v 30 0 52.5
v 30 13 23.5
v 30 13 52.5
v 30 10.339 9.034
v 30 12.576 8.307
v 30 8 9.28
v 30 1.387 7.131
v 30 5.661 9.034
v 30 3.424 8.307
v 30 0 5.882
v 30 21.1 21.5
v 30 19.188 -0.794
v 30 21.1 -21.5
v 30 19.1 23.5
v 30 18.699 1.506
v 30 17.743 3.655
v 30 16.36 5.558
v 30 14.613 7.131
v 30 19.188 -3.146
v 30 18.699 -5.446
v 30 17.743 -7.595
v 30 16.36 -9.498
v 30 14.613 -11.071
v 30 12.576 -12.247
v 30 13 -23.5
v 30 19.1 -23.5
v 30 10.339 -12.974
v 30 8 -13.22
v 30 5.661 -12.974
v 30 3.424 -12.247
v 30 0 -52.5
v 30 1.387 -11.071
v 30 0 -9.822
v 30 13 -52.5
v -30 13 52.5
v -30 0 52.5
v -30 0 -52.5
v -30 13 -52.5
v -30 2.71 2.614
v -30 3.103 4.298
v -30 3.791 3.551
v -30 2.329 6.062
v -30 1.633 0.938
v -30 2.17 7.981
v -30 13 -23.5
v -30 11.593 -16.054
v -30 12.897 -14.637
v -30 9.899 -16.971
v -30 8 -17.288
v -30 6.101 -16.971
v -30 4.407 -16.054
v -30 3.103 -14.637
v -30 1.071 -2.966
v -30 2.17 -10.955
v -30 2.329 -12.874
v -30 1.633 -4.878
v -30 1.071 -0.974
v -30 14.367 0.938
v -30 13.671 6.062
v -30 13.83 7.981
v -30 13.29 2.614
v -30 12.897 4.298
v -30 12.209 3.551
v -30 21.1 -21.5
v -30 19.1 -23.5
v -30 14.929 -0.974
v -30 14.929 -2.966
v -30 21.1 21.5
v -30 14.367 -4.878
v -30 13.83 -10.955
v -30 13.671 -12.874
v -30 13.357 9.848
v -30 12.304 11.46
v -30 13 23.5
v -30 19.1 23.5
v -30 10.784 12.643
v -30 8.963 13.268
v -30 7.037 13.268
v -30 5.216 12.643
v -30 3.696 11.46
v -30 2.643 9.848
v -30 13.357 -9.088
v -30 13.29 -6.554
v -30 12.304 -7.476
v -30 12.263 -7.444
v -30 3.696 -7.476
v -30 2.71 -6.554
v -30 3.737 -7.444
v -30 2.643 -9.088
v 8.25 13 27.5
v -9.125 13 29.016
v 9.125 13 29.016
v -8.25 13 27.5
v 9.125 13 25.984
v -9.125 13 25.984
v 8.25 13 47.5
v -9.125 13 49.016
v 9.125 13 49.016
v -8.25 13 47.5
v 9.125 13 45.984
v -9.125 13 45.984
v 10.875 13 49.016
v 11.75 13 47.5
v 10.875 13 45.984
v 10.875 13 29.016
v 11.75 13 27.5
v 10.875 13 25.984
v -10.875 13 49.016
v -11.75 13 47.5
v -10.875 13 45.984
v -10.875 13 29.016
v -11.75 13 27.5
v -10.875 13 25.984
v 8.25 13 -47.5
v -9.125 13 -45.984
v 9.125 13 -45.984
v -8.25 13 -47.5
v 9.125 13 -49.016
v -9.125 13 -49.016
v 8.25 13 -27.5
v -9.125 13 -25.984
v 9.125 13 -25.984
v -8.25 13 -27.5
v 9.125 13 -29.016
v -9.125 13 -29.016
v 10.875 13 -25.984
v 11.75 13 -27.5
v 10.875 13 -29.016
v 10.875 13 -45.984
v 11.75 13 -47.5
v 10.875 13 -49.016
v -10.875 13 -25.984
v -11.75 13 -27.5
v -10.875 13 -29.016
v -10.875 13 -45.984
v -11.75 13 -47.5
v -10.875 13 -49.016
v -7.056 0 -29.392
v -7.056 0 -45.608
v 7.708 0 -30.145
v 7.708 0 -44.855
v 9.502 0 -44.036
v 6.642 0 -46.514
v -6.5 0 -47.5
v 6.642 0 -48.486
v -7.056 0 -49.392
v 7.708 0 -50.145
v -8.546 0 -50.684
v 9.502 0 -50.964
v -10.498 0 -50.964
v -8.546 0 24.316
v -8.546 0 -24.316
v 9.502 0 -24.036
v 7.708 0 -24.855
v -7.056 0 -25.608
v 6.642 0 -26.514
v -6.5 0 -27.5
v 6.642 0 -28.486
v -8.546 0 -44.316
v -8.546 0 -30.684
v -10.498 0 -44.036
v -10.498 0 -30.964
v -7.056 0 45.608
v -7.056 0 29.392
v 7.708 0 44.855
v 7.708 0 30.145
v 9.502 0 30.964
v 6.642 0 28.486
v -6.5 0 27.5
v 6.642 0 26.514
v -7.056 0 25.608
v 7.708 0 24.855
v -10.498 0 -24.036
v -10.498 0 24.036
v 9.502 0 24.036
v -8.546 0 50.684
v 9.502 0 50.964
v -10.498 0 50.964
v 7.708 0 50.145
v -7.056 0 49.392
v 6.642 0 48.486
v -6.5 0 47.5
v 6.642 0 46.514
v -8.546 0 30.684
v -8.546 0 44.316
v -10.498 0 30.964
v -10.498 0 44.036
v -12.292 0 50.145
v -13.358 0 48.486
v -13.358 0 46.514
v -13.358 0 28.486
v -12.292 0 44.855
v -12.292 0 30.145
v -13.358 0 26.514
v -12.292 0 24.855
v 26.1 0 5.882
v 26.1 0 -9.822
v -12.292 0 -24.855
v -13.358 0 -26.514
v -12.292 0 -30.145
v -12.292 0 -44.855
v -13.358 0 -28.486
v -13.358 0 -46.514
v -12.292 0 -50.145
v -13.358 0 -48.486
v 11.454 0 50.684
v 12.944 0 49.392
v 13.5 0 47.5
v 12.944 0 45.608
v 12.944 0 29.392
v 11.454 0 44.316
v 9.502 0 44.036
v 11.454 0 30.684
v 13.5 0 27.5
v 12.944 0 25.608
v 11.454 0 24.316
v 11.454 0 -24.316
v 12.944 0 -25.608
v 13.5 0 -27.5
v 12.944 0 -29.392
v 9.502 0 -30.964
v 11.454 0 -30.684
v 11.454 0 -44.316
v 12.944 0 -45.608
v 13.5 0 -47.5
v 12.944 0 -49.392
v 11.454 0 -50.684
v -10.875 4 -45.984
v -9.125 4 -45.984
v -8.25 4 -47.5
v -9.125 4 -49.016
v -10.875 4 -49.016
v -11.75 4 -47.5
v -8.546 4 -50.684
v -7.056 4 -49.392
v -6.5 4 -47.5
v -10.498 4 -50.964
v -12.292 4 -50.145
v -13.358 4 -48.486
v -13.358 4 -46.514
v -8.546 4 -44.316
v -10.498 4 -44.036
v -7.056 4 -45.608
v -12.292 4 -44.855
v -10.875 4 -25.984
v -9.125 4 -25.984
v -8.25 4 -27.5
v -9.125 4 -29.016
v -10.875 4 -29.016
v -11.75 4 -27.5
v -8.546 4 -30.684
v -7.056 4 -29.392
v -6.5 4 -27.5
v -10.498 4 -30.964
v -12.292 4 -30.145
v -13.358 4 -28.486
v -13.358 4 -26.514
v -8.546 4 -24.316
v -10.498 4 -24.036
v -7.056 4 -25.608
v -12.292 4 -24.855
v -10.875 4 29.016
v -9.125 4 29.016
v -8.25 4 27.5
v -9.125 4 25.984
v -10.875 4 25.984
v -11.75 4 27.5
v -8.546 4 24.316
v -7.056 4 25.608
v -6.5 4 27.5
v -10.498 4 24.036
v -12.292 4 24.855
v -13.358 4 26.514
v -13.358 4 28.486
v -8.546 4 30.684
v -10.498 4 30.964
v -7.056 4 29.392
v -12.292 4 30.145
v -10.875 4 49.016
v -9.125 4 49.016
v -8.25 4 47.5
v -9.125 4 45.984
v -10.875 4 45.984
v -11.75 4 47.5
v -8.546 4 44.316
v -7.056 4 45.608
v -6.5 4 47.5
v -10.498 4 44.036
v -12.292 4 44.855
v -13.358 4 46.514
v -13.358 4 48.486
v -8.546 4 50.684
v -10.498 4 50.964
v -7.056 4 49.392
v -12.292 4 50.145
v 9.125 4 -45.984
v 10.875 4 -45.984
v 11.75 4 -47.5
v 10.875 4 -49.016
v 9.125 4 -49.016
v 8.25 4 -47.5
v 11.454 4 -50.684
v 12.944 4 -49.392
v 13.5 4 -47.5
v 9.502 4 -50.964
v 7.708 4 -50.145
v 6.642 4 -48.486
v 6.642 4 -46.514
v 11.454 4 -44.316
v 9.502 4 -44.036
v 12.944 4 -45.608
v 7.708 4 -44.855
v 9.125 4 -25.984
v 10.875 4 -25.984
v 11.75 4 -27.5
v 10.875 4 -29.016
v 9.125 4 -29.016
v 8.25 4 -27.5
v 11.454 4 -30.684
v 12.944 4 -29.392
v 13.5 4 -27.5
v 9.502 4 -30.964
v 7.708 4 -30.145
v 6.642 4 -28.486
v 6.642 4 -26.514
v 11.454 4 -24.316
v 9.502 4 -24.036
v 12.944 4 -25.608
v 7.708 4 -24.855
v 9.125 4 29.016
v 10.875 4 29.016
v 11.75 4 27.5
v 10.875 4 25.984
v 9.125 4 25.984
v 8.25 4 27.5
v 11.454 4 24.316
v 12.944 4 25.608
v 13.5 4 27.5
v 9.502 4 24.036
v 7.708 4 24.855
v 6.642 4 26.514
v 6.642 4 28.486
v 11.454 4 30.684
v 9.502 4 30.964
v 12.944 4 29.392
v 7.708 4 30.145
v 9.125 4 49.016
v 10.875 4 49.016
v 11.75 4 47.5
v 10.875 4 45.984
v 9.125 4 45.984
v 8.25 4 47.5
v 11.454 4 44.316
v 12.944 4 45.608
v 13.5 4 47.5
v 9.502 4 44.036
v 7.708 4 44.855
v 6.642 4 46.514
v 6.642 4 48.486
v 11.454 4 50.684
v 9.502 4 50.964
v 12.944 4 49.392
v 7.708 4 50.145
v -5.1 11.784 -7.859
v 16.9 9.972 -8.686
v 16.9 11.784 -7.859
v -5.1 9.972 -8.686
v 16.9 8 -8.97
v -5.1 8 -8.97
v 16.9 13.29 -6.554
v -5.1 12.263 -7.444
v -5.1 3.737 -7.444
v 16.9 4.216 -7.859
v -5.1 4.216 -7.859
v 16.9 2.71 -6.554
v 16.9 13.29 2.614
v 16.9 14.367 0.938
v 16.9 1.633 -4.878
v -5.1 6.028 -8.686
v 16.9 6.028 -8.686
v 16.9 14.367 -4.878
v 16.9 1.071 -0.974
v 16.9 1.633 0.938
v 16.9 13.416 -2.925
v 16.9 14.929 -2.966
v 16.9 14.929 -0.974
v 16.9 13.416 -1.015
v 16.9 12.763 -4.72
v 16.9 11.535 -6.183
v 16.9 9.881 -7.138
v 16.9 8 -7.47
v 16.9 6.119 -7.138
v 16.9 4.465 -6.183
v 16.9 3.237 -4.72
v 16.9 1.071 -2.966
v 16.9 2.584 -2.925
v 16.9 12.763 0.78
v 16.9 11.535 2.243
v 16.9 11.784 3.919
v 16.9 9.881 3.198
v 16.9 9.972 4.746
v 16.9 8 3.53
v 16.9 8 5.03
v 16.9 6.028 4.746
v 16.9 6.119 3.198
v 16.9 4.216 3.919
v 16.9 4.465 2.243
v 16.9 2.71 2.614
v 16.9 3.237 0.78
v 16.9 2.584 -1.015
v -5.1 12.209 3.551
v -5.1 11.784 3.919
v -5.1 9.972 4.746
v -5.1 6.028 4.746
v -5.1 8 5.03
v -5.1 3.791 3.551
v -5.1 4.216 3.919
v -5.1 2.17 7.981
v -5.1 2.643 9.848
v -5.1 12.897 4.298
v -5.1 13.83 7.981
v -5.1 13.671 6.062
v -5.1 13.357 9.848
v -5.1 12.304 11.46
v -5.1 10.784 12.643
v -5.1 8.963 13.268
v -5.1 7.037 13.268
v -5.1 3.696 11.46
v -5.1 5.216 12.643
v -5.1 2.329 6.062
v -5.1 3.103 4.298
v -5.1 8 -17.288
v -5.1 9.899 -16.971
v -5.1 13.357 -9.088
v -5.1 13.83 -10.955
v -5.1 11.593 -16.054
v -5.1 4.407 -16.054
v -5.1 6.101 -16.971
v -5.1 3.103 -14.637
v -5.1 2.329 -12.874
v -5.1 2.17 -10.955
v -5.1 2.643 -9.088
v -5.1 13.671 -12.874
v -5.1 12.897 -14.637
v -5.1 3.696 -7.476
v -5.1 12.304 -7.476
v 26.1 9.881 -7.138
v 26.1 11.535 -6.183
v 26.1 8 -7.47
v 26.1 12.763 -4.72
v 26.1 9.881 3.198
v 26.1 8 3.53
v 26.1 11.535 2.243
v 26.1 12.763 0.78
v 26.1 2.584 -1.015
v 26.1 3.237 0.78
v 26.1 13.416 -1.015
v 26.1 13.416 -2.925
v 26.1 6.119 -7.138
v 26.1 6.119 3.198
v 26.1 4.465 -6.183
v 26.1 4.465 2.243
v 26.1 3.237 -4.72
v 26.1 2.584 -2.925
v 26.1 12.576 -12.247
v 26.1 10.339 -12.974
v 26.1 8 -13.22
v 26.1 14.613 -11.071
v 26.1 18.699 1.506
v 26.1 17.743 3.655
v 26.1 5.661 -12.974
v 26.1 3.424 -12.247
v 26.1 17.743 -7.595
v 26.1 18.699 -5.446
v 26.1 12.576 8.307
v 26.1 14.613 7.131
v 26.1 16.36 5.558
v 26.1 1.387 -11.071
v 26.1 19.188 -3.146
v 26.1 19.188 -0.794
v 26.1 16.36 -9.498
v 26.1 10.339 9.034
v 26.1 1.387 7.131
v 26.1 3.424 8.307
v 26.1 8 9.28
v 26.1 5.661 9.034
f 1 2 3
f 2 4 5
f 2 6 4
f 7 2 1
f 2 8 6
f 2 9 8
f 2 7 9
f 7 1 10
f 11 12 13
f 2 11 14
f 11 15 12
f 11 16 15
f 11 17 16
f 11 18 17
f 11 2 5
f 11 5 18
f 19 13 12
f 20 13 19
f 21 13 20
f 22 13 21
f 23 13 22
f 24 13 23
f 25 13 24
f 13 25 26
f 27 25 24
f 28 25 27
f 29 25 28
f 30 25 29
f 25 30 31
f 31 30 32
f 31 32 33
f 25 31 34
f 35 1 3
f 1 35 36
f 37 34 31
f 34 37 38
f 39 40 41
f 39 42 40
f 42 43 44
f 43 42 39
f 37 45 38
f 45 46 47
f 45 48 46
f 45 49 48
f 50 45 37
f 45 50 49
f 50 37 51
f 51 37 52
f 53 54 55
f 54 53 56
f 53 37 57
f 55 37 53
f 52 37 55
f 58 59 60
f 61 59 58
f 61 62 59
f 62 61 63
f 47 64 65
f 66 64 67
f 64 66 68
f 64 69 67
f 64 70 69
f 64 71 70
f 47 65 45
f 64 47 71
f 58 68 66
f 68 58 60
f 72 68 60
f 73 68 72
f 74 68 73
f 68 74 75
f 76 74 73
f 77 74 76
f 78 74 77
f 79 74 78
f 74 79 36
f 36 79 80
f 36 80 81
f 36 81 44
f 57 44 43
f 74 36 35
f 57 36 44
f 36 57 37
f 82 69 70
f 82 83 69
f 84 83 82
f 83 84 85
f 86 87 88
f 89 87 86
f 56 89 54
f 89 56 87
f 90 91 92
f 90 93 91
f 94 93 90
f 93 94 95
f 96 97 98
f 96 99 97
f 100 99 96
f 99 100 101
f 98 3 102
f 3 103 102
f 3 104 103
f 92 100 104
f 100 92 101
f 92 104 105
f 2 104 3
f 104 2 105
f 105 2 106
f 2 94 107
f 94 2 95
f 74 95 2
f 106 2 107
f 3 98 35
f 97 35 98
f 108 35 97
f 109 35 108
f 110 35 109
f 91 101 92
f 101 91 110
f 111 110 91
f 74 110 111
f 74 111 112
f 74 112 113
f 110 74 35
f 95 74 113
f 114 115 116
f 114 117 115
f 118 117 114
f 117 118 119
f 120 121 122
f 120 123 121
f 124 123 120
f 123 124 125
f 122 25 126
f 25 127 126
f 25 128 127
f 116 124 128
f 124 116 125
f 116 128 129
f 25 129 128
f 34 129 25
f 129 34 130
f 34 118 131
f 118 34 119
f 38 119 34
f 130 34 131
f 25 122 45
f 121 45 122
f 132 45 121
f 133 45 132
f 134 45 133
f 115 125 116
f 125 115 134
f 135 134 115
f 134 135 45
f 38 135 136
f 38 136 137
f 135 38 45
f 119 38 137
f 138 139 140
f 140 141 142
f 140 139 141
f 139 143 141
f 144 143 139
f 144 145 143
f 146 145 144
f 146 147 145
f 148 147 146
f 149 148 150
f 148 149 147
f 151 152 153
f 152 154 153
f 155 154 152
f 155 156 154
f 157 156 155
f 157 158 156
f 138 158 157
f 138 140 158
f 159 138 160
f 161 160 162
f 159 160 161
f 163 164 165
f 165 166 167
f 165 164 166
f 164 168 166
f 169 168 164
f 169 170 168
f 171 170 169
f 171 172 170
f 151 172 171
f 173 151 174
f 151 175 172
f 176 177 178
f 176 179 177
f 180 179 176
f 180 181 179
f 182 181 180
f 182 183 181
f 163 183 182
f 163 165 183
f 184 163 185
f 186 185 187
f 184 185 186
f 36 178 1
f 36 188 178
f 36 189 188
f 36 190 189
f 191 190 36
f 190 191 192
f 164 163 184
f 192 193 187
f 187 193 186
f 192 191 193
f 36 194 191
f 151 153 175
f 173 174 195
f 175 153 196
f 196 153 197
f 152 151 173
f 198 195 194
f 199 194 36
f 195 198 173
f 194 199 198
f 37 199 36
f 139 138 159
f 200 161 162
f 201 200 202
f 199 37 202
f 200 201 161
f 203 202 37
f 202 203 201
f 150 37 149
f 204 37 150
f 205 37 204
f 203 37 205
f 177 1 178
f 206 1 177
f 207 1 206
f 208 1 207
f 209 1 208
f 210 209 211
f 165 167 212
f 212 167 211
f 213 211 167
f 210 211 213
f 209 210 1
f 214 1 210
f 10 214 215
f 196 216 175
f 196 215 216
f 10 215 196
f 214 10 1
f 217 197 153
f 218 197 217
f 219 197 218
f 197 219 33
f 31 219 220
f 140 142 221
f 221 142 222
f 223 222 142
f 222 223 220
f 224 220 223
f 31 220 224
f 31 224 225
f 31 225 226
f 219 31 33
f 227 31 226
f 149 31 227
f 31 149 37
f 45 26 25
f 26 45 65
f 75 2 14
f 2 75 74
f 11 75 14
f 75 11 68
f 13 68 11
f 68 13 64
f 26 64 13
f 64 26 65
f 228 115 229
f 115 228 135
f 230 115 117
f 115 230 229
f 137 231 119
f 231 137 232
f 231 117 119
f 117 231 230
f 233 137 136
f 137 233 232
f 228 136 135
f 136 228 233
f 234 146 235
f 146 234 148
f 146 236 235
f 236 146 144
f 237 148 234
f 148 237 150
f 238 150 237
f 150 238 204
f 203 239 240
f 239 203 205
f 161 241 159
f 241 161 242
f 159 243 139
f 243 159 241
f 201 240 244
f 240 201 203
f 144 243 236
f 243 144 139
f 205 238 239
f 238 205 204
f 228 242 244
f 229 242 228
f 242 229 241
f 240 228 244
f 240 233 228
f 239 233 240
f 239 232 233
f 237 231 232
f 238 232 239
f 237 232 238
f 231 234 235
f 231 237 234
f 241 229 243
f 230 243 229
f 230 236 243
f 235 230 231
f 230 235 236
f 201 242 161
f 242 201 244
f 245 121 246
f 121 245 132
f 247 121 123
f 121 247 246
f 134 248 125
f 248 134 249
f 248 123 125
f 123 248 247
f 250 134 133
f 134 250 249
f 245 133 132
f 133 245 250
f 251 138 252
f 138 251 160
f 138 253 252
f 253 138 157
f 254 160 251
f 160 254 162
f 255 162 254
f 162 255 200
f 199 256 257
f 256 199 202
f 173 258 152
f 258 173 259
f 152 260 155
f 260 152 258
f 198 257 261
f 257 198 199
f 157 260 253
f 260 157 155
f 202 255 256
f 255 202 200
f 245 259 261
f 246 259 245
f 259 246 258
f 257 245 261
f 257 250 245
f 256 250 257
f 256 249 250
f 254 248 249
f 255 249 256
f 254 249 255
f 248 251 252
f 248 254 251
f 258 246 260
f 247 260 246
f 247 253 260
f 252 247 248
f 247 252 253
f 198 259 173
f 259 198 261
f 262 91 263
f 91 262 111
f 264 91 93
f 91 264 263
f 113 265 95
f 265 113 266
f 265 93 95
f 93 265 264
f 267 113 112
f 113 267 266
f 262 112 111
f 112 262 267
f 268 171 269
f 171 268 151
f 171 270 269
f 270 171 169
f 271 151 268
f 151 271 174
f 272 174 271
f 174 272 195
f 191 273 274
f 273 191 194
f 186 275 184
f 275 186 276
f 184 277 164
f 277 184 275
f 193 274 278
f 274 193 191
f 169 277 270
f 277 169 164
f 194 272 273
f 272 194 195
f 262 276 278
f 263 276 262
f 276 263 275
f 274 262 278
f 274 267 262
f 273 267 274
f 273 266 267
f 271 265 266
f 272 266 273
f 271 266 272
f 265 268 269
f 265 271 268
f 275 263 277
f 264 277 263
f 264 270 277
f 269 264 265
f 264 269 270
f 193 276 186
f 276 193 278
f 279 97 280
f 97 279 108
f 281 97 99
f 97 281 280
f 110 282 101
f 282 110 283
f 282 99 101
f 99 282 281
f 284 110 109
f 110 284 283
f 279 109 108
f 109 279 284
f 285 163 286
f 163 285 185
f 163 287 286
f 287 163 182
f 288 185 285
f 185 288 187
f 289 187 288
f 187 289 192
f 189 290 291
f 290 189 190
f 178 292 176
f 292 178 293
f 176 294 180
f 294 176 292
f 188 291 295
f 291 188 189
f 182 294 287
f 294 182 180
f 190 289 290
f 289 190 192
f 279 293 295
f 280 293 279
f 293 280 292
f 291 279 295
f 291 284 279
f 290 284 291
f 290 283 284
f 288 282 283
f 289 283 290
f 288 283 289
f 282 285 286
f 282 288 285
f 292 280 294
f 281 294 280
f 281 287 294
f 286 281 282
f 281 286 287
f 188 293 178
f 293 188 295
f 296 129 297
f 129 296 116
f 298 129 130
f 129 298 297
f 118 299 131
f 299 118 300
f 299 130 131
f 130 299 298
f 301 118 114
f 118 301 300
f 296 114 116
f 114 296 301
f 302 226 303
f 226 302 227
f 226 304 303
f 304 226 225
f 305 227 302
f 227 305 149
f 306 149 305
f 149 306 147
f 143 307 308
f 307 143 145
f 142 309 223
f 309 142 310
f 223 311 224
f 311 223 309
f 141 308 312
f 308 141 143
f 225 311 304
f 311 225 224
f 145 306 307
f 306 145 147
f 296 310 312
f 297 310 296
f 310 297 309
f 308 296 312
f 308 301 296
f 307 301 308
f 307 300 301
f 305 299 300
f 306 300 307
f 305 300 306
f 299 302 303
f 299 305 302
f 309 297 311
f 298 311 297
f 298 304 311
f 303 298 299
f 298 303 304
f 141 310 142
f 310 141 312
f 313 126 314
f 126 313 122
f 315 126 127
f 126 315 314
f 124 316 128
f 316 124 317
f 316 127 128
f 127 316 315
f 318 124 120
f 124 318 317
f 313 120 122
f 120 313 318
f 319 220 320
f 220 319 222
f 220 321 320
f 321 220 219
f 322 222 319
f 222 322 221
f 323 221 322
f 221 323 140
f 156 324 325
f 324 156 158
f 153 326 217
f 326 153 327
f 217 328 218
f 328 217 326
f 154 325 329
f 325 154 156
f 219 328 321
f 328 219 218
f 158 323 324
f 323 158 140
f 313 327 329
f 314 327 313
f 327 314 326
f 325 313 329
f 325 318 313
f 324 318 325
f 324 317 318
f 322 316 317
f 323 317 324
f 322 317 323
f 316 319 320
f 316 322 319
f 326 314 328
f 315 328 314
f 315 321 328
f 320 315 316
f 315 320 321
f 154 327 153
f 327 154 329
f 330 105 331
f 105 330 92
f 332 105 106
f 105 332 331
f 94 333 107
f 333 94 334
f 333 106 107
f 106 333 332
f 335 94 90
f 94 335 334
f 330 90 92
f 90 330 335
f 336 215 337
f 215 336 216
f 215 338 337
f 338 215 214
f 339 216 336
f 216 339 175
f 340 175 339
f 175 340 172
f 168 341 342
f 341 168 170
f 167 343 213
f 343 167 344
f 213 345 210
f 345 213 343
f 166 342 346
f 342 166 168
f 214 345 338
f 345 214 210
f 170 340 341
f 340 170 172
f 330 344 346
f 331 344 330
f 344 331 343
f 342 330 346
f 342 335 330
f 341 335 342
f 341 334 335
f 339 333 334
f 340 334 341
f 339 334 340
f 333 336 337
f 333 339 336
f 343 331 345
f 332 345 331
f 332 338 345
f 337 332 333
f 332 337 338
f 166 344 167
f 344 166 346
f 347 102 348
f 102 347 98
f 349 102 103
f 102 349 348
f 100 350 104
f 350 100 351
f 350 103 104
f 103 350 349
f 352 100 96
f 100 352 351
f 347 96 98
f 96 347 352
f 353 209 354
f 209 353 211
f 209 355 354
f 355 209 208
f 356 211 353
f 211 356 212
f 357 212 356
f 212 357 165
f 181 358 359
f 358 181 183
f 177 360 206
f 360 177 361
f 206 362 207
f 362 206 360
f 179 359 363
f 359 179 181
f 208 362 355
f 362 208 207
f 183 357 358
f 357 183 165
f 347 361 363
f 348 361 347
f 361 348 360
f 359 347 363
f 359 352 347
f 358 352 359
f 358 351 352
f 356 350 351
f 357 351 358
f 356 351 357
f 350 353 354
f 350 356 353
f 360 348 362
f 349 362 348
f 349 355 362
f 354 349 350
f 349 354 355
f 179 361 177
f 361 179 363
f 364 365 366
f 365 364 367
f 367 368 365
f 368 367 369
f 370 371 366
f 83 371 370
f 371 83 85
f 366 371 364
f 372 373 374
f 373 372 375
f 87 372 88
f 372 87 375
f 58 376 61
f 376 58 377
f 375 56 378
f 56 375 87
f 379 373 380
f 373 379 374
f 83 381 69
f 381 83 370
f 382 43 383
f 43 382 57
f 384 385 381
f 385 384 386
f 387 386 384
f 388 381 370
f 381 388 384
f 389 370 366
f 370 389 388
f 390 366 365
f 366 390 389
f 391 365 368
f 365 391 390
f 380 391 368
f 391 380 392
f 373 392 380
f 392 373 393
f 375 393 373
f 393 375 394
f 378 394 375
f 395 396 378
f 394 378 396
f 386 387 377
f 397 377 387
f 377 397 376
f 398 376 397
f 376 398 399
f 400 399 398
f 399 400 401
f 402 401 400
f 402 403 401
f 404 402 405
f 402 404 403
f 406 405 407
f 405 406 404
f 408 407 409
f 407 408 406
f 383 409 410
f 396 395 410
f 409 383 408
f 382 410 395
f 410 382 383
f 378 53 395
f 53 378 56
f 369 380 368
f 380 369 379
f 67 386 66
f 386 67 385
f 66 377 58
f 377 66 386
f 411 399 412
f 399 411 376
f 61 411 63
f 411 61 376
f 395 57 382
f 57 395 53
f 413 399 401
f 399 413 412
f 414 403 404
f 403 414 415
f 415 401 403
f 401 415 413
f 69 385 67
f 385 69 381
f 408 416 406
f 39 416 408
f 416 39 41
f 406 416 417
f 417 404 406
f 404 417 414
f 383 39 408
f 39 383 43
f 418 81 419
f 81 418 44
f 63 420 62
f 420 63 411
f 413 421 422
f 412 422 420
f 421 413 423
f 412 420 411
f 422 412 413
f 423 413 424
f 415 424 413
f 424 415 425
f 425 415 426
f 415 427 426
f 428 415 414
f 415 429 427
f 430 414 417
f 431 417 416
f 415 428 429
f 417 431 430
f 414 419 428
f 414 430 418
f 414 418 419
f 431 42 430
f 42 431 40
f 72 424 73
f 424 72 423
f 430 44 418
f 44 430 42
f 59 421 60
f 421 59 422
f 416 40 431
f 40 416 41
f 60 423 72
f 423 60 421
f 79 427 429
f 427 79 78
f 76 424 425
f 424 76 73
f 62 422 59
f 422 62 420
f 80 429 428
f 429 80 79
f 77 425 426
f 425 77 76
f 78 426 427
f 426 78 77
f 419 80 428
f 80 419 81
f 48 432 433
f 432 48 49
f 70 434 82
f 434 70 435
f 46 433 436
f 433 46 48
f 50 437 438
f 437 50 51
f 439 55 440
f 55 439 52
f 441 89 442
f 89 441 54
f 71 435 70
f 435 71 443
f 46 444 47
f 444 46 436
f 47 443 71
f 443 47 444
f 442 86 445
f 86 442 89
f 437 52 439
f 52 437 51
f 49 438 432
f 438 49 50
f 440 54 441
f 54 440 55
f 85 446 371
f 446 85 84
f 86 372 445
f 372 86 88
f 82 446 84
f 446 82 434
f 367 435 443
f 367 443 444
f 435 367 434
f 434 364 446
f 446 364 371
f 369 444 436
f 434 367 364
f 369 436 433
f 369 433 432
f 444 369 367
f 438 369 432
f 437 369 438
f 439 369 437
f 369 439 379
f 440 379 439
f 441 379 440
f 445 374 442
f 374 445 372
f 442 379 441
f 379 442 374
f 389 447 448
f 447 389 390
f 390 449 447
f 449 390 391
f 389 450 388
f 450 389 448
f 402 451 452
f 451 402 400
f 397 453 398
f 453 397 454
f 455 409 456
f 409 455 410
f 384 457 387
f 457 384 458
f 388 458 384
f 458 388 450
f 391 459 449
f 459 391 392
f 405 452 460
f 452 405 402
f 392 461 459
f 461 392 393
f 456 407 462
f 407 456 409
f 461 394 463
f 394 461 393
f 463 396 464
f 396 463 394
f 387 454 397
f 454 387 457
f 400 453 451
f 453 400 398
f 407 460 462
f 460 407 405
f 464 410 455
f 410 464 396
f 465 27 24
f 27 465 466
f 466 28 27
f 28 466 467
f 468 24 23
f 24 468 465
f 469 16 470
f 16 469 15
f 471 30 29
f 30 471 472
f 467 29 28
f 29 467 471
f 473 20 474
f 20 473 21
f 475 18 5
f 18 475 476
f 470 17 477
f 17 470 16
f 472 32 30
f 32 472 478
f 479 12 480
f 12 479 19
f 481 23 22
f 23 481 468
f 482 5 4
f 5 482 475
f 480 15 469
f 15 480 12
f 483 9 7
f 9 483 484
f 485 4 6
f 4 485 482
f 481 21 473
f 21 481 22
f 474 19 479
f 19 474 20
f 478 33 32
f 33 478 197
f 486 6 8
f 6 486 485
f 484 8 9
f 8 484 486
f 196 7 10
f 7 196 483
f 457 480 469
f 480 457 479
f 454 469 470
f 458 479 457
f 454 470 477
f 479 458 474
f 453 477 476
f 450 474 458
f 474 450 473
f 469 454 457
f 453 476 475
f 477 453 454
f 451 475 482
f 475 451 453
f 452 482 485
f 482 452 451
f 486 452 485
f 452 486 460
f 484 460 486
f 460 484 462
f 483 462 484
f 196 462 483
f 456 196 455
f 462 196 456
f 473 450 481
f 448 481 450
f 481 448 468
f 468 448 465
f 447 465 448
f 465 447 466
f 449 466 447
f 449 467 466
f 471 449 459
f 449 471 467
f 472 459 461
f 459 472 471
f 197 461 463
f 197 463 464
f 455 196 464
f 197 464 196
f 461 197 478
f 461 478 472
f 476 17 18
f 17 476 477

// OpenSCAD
difference() {
union() {
multmatrix([[1, 0, 0, 0], [0, 1, 0, 13/2], [0, 0, 1, 0], [0, 0, 0, 1]]) cube([60, 13, 105], center=true);
multmatrix([[1, 0, 0, -30], [0, 1, 0, 8], [0, 0, 1, 0], [0, 0, 0, 1]]) multmatrix([[6.123233995736766E-17, 0.0, 1.0], [0.0, 1.0, 0.0], [-1.0, 0.0, 6.123233995736766E-17]]) linear_extrude(60) polygon(points=[[23.5, 0], [23.5, 11.1], [21.5, 13.1], [-21.5, 13.1], [-23.5, 11.1], [-23.5, 0]]);
}

union() {
multmatrix([[1, 0, 0, -10], [0, 1, 0, -0.1], [0, 0, 1, -95/2], [0, 0, 0, 1]]) multmatrix([[1.0, -0.0, 0.0], [0.0, 6.123233995736766E-17, 1.0], [-0.0, -1.0, 6.123233995736766E-17]]) union() {
cylinder(h=13.2, d=3.5);
cylinder(h=4.1, d=7.0);
}

multmatrix([[1, 0, 0, -10], [0, 1, 0, -0.1], [0, 0, 1, -55/2], [0, 0, 0, 1]]) multmatrix([[1.0, -0.0, 0.0], [0.0, 6.123233995736766E-17, 1.0], [-0.0, -1.0, 6.123233995736766E-17]]) union() {
cylinder(h=13.2, d=3.5);
cylinder(h=4.1, d=7.0);
}

multmatrix([[1, 0, 0, -10], [0, 1, 0, -0.1], [0, 0, 1, 55/2], [0, 0, 0, 1]]) multmatrix([[1.0, -0.0, 0.0], [0.0, 6.123233995736766E-17, 1.0], [-0.0, -1.0, 6.123233995736766E-17]]) union() {
cylinder(h=13.2, d=3.5);
cylinder(h=4.1, d=7.0);
}

multmatrix([[1, 0, 0, -10], [0, 1, 0, -0.1], [0, 0, 1, 95/2], [0, 0, 0, 1]]) multmatrix([[1.0, -0.0, 0.0], [0.0, 6.123233995736766E-17, 1.0], [-0.0, -1.0, 6.123233995736766E-17]]) union() {
cylinder(h=13.2, d=3.5);
cylinder(h=4.1, d=7.0);
}

multmatrix([[1, 0, 0, 10], [0, 1, 0, -0.1], [0, 0, 1, -95/2], [0, 0, 0, 1]]) multmatrix([[1.0, -0.0, 0.0], [0.0, 6.123233995736766E-17, 1.0], [-0.0, -1.0, 6.123233995736766E-17]]) union() {
cylinder(h=13.2, d=3.5);
cylinder(h=4.1, d=7.0);
}

multmatrix([[1, 0, 0, 10], [0, 1, 0, -0.1], [0, 0, 1, -55/2], [0, 0, 0, 1]]) multmatrix([[1.0, -0.0, 0.0], [0.0, 6.123233995736766E-17, 1.0], [-0.0, -1.0, 6.123233995736766E-17]]) union() {
cylinder(h=13.2, d=3.5);
cylinder(h=4.1, d=7.0);
}

multmatrix([[1, 0, 0, 10], [0, 1, 0, -0.1], [0, 0, 1, 55/2], [0, 0, 0, 1]]) multmatrix([[1.0, -0.0, 0.0], [0.0, 6.123233995736766E-17, 1.0], [-0.0, -1.0, 6.123233995736766E-17]]) union() {
cylinder(h=13.2, d=3.5);
cylinder(h=4.1, d=7.0);
}

multmatrix([[1, 0, 0, 10], [0, 1, 0, -0.1], [0, 0, 1, 95/2], [0, 0, 0, 1]]) multmatrix([[1.0, -0.0, 0.0], [0.0, 6.123233995736766E-17, 1.0], [-0.0, -1.0, 6.123233995736766E-17]]) union() {
cylinder(h=13.2, d=3.5);
cylinder(h=4.1, d=7.0);
}

}

multmatrix([[1, 0, 0, -30], [0, 1, 0, 8], [0, 0, 1, -1.9699999999999989], [0, 0, 0, 1]]) multmatrix([[6.123233995736766E-17, 0.0, 1.0], [0.0, 1.0, 0.0], [-1.0, 0.0, 6.123233995736766E-17]]) union() {
multmatrix([[1, 0, 0, 0], [0, 1, 0, 0], [0, 0, 1, -0.1], [0, 0, 0, 1]]) cylinder(h=60.2, d=11.0);
multmatrix([[1, 0, 0, 0], [0, 1, 0, 0], [0, 0, 1, 56.1], [0, 0, 0, 1]]) cylinder(h=4.1, d=22.5);
union() {
multmatrix([[1, 0, 0, 0], [0, 1, 0, 0], [0, 0, 1, -0.1], [0, 0, 0, 1]]) cylinder(h=47, d=14);
multmatrix([[1, 0, 0, -9.4678403028357], [0, 1, 0, 0], [0, 0, 1, -0.1], [0, 0, 0, 1]]) cylinder(h=25, d=11.7);
multmatrix([[1, 0, 0, 9.4678403028357], [0, 1, 0, 0], [0, 0, 1, -0.1], [0, 0, 0, 1]]) cylinder(h=25, d=11.7);
}

}

}
